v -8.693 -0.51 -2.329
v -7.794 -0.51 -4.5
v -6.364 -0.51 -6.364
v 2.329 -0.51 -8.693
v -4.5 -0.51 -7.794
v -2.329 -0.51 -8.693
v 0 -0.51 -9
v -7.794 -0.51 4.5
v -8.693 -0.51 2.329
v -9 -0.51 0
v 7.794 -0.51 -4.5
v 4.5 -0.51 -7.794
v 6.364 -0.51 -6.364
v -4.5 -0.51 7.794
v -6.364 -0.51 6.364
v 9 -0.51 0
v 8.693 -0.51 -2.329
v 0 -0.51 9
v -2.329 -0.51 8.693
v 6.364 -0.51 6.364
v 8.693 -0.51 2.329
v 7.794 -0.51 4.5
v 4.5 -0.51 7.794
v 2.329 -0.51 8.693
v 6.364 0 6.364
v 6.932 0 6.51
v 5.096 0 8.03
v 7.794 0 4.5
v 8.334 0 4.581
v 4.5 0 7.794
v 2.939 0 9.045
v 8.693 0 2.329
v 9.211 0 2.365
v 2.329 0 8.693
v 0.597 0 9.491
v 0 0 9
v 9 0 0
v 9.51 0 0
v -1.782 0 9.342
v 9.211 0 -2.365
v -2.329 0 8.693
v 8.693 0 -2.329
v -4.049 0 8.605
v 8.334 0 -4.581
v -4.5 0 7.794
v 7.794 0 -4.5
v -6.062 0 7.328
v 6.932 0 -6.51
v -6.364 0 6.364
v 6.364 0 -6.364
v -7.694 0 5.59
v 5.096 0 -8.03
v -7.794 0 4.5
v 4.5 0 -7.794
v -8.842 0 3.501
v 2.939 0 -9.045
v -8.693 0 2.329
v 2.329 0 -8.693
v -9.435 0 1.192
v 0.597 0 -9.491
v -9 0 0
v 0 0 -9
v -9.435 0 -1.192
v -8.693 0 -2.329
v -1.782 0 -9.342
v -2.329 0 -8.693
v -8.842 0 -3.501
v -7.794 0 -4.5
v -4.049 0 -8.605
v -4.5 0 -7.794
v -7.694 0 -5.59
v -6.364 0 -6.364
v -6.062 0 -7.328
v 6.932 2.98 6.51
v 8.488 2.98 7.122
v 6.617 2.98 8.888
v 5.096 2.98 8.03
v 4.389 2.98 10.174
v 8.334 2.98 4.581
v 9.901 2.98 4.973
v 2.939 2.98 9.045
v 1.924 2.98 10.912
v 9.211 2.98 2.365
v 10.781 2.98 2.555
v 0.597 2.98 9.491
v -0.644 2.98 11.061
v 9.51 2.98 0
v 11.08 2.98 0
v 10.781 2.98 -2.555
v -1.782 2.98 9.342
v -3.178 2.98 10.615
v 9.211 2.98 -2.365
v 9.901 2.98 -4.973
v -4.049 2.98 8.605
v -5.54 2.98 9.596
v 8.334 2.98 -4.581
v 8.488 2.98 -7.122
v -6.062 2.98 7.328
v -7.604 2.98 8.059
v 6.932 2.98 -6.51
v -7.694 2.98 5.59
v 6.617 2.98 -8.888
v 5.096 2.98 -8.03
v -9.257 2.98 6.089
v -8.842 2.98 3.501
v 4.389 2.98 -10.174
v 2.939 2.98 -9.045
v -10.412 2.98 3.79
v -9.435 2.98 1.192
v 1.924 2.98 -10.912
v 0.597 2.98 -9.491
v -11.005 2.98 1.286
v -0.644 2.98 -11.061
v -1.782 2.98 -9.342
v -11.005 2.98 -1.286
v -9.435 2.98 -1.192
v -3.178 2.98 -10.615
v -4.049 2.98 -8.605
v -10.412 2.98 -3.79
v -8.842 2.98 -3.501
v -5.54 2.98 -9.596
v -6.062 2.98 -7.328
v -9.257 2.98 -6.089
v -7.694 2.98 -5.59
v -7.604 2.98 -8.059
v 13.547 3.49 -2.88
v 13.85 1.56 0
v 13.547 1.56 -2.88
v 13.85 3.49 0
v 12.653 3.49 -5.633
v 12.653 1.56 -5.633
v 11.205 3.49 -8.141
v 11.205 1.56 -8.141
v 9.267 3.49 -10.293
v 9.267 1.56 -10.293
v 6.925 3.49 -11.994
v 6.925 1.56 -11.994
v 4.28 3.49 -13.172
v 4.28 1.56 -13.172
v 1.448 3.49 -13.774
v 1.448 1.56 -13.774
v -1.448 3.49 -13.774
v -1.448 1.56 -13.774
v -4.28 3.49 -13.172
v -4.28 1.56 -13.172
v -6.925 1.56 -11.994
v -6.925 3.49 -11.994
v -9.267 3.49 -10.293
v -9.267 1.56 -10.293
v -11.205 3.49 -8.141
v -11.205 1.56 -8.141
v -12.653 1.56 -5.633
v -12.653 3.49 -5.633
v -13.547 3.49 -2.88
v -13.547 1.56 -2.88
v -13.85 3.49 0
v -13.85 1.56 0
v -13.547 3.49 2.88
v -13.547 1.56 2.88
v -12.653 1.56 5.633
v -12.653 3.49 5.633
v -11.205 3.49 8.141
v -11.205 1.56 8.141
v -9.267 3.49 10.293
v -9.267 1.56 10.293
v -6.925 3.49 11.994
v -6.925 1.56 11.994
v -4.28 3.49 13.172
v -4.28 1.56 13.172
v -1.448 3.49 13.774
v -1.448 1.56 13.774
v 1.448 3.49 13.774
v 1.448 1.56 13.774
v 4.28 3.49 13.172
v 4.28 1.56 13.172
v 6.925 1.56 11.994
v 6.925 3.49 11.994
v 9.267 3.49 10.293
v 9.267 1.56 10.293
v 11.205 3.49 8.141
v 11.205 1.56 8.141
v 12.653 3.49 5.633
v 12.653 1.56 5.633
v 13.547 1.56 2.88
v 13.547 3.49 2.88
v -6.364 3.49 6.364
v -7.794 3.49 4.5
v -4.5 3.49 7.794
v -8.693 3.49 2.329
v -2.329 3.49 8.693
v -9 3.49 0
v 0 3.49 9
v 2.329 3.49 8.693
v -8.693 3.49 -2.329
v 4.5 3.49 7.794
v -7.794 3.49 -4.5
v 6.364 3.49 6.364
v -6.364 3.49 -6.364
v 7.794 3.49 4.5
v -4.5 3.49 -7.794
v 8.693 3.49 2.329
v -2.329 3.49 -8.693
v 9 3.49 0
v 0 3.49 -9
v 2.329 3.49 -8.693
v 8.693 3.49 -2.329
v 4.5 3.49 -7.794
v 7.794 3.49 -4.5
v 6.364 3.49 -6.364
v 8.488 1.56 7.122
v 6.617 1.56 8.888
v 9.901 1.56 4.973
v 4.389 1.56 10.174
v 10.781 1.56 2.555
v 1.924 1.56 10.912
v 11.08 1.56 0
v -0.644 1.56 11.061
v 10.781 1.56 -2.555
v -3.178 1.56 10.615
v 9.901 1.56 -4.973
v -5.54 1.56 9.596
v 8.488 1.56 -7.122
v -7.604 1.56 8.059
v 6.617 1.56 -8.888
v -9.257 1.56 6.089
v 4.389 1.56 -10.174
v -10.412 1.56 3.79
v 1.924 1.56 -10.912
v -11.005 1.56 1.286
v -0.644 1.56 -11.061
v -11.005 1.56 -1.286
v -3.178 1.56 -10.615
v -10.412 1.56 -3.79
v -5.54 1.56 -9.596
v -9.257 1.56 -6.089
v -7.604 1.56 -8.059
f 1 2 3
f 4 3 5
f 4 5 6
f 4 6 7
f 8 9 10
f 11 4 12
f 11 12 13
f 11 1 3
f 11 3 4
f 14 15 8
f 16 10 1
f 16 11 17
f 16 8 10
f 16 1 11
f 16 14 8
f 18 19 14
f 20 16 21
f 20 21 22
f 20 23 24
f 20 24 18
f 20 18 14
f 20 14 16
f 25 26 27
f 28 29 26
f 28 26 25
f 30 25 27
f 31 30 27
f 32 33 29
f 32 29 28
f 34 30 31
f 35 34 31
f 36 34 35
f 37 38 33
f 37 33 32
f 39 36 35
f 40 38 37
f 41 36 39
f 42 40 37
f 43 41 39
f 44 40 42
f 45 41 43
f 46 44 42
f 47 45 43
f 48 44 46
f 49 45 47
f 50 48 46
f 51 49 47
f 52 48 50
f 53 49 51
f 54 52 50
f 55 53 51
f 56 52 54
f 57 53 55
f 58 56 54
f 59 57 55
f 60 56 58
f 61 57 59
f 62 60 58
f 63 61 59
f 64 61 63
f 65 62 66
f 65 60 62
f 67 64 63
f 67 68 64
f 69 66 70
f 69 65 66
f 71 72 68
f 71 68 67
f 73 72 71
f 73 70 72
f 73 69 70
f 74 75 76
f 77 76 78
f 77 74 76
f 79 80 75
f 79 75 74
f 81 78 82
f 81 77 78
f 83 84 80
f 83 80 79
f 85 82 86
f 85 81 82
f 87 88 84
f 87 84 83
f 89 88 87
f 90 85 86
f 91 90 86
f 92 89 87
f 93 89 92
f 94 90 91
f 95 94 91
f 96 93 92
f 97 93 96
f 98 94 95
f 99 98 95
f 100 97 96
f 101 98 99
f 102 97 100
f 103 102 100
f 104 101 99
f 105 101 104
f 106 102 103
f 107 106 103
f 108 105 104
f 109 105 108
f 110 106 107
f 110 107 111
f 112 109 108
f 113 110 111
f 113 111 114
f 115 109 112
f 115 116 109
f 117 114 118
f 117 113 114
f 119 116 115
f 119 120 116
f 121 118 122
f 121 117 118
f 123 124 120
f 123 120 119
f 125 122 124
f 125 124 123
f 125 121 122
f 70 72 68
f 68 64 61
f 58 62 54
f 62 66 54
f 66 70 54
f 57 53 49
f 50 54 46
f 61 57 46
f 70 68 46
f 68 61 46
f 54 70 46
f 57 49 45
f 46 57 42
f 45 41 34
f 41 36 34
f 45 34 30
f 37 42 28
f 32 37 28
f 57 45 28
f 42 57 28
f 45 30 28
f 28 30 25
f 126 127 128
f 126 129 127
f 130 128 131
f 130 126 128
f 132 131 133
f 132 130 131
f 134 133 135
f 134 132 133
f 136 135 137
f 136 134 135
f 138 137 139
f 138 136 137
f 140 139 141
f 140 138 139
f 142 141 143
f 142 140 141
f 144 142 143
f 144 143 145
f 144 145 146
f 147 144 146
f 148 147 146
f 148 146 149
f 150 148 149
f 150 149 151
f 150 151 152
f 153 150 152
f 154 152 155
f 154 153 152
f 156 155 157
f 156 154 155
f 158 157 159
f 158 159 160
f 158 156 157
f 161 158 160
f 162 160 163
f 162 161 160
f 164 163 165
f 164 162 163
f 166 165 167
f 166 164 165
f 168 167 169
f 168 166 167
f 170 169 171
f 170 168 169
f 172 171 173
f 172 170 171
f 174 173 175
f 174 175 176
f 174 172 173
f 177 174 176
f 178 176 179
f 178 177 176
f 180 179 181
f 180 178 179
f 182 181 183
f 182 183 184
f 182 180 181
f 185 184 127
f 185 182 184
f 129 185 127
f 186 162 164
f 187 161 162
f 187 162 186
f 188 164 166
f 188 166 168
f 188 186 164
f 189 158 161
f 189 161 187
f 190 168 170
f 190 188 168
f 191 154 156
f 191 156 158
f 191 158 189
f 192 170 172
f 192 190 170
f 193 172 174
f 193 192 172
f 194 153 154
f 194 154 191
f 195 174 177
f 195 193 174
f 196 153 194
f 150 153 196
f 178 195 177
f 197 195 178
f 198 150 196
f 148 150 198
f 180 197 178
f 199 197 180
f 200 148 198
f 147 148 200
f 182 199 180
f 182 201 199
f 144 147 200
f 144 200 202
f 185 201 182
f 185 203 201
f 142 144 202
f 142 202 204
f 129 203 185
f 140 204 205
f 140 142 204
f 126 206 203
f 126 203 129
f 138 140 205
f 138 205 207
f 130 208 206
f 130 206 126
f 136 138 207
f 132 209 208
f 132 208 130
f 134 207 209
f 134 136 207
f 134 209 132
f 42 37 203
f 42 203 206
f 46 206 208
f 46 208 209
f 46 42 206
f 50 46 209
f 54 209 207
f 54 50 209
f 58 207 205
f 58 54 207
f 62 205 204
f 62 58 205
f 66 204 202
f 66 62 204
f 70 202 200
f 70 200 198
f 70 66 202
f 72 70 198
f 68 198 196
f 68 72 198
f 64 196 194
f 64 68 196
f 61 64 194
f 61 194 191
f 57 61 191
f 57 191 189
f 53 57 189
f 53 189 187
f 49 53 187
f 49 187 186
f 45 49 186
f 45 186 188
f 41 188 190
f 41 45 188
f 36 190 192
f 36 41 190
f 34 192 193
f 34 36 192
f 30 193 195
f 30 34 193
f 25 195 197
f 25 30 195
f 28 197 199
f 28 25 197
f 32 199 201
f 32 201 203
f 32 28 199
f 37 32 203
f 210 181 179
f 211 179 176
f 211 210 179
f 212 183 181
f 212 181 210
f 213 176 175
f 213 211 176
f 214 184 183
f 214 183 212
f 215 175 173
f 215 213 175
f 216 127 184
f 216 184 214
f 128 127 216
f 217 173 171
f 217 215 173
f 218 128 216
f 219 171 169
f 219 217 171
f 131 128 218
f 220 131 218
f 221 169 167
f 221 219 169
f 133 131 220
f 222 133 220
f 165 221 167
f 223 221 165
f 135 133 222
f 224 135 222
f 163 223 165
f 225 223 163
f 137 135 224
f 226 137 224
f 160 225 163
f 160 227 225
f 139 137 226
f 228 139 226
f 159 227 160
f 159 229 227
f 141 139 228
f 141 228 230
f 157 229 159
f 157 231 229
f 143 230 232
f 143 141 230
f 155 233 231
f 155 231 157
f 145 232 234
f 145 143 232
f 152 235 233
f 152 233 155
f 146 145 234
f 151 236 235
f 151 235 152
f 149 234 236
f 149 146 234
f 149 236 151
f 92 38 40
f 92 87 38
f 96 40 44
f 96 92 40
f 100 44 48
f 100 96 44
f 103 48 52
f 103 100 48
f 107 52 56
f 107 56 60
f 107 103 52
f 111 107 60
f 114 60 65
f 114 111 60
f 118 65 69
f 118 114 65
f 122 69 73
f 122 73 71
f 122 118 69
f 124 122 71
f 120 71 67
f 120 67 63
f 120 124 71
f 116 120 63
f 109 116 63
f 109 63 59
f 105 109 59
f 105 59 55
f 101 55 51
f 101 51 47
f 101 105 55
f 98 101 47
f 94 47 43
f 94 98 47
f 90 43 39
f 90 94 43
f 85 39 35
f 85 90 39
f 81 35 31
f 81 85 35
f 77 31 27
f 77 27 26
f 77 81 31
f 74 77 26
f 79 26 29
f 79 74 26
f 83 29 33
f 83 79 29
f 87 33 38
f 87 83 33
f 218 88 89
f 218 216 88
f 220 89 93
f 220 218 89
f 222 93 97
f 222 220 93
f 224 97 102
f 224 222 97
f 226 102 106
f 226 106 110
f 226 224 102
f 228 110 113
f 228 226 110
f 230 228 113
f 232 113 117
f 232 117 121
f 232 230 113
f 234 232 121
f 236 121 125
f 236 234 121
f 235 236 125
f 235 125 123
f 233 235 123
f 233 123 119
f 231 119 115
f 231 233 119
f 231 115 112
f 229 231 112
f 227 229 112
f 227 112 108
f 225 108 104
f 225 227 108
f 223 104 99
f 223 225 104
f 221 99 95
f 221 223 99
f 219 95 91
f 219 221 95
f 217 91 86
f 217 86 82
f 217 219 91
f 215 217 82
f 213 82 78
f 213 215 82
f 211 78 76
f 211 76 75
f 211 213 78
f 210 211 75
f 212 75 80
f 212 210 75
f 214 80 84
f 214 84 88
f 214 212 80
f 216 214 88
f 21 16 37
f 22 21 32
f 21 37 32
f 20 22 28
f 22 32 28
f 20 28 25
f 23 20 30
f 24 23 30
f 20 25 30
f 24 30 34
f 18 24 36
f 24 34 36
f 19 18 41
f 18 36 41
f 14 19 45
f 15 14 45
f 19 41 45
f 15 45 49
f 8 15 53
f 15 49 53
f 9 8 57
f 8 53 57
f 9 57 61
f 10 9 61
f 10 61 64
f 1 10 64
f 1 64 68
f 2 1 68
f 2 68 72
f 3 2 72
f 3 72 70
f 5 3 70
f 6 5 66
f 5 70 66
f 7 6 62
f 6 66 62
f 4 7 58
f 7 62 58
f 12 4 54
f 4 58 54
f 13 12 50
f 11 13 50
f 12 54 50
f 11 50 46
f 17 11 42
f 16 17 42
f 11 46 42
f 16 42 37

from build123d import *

# Parameters (mm, degrees)
F0_W     = 1.57
F0_H     = 0.51
F3_R     = 9
F4_DEPTH = 0.51


# Not quite as in the source:
# - the program builds the solid bodies; features that only make, move or delete a surface that nothing else refers to are left out


with BuildPart() as f1:
    # F0 (on Top) → F1 (revolve)
    with BuildSketch(Plane.XY):
        Polygon((9, 3.49), (9, 0), (9.51, 0), (9.51, 2.98), (9.51, 3.49), align=None)
        with Locations((10.295, 3.235)):
            Rectangle(F0_W, F0_H)
        Polygon((13.85, 3.49), (11.08, 3.49), (11.08, 2.98), (11.08, 1.56), (13.85, 1.56), align=None)
    revolve(axis=Axis((0, 1.745, 0), (0, 1, 0)))

    # F3 (on offset) → F4 (join)
    with BuildSketch(Plane.XZ):
        Circle(F3_R)
    extrude(amount=F4_DEPTH)


solid = f1.part
